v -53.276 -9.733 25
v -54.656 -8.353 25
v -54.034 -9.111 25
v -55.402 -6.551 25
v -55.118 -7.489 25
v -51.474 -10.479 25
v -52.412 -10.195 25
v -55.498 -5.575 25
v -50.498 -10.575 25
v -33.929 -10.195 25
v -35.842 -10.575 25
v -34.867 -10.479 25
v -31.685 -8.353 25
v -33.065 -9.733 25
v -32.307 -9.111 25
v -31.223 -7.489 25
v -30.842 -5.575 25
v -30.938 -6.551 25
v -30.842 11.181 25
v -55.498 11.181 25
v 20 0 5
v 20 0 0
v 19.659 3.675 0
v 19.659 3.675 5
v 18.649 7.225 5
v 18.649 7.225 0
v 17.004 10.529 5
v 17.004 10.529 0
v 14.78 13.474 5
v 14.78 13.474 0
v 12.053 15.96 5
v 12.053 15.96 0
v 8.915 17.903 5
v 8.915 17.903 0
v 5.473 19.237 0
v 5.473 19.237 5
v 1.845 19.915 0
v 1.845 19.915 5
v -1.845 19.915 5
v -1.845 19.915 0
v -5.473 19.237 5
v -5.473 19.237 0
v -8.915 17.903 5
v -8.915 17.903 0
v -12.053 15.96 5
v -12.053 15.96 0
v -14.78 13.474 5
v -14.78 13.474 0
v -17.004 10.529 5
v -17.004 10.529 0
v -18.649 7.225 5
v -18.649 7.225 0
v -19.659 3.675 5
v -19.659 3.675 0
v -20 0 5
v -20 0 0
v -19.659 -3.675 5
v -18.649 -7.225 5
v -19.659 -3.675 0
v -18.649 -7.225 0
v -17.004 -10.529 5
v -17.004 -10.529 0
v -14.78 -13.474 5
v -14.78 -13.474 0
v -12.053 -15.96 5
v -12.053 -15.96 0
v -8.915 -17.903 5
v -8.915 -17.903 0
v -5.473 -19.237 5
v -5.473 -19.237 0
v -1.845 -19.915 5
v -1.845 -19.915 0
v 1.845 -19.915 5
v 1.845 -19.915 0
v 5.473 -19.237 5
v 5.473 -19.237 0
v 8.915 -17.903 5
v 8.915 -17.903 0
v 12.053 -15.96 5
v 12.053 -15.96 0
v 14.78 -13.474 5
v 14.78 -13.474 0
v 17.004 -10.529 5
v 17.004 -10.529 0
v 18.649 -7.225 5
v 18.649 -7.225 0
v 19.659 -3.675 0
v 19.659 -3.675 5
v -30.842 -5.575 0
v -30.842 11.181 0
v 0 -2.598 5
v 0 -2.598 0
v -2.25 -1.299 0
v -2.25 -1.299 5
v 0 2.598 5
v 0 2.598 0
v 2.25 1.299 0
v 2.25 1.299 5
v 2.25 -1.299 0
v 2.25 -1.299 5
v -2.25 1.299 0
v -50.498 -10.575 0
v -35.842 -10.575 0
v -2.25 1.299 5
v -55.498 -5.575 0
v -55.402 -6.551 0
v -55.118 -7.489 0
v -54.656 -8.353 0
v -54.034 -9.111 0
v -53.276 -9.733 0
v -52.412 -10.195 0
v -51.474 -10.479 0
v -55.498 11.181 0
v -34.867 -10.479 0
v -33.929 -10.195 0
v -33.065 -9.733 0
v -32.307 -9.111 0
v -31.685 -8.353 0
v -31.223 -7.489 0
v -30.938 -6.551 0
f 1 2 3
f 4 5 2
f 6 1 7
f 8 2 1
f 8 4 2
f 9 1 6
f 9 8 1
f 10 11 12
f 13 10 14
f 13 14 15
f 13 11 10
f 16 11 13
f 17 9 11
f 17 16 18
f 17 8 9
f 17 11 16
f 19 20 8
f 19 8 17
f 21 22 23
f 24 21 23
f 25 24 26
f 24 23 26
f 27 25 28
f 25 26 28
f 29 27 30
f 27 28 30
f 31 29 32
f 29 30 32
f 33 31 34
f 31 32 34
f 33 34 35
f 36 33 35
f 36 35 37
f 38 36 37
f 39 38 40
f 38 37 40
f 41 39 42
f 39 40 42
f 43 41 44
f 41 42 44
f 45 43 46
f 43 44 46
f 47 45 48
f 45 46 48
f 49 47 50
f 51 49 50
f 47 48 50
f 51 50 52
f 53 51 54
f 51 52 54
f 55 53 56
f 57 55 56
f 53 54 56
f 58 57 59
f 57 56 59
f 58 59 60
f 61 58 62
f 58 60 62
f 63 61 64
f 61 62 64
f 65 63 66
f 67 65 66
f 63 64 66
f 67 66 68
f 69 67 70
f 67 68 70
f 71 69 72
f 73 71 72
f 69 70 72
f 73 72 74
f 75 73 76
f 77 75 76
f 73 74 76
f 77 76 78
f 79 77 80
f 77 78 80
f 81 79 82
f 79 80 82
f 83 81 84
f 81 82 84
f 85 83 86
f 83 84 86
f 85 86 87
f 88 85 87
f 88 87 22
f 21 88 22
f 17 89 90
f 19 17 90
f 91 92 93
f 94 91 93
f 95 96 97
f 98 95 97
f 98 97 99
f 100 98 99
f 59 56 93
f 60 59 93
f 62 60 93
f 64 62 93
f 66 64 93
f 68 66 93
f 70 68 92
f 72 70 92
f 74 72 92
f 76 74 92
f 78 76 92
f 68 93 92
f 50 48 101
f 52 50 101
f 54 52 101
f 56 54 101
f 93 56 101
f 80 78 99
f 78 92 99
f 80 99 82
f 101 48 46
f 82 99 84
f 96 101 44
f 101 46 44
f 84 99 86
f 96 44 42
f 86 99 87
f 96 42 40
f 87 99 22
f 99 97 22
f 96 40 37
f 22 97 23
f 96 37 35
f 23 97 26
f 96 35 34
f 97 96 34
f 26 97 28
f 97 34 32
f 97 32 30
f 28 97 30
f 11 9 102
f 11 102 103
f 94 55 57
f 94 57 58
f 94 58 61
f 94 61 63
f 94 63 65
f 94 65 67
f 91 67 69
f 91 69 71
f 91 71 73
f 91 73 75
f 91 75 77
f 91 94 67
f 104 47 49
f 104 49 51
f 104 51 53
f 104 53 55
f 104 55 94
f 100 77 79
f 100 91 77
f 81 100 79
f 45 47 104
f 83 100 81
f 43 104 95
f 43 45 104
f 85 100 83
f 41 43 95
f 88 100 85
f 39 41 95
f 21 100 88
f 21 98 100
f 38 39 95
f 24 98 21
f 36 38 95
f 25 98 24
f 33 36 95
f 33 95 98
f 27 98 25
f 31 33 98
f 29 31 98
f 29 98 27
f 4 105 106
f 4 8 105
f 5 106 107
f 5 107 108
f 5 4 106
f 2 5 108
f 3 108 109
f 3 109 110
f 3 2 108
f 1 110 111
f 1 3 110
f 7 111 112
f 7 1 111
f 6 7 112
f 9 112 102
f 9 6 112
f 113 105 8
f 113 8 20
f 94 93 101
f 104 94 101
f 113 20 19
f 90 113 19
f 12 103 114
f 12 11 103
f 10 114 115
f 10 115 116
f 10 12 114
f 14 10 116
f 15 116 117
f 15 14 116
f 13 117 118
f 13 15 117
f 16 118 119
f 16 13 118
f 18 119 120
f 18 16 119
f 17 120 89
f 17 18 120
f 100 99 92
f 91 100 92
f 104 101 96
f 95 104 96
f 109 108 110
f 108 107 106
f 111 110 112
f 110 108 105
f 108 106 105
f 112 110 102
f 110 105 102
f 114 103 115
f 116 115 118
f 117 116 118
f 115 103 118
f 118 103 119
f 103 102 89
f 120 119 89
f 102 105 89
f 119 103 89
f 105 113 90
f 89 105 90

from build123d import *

# Parameters (mm, degrees)
F0_R     = 20
F1_DEPTH = 5
F0_W     = 24.656
F0_H     = 21.756
F2_DEPTH = 25
F3_R     = 5


with BuildPart() as f1:
    # F0 (on Top) → F1 (new body)
    with BuildSketch(Plane.XY):
        Circle(F0_R)
        Polygon((0, 2.598076), (2.25, 1.299038), (2.25, -1.299038), (0, -2.598076), (-2.25, -1.299038), (-2.25, 1.299038), align=None, mode=Mode.SUBTRACT)
    extrude(amount=F1_DEPTH)


with BuildPart() as f2:
    # F0 (on Top) → F2 (new body)
    with BuildSketch(Plane.XY):
        with Locations((-43.170358, 0.302571)):
            Rectangle(F0_W, F0_H)
    extrude(amount=F2_DEPTH)

    # F3
    f3_edges = [f2.edges().sort_by_distance(p)[0] for p in [
        (-30.842358, -10.575429, 12.5),
        (-55.498358, -10.575429, 12.5),
    ]]
    fillet(f3_edges, radius=F3_R)


solid = Compound([f1.part, f2.part])
